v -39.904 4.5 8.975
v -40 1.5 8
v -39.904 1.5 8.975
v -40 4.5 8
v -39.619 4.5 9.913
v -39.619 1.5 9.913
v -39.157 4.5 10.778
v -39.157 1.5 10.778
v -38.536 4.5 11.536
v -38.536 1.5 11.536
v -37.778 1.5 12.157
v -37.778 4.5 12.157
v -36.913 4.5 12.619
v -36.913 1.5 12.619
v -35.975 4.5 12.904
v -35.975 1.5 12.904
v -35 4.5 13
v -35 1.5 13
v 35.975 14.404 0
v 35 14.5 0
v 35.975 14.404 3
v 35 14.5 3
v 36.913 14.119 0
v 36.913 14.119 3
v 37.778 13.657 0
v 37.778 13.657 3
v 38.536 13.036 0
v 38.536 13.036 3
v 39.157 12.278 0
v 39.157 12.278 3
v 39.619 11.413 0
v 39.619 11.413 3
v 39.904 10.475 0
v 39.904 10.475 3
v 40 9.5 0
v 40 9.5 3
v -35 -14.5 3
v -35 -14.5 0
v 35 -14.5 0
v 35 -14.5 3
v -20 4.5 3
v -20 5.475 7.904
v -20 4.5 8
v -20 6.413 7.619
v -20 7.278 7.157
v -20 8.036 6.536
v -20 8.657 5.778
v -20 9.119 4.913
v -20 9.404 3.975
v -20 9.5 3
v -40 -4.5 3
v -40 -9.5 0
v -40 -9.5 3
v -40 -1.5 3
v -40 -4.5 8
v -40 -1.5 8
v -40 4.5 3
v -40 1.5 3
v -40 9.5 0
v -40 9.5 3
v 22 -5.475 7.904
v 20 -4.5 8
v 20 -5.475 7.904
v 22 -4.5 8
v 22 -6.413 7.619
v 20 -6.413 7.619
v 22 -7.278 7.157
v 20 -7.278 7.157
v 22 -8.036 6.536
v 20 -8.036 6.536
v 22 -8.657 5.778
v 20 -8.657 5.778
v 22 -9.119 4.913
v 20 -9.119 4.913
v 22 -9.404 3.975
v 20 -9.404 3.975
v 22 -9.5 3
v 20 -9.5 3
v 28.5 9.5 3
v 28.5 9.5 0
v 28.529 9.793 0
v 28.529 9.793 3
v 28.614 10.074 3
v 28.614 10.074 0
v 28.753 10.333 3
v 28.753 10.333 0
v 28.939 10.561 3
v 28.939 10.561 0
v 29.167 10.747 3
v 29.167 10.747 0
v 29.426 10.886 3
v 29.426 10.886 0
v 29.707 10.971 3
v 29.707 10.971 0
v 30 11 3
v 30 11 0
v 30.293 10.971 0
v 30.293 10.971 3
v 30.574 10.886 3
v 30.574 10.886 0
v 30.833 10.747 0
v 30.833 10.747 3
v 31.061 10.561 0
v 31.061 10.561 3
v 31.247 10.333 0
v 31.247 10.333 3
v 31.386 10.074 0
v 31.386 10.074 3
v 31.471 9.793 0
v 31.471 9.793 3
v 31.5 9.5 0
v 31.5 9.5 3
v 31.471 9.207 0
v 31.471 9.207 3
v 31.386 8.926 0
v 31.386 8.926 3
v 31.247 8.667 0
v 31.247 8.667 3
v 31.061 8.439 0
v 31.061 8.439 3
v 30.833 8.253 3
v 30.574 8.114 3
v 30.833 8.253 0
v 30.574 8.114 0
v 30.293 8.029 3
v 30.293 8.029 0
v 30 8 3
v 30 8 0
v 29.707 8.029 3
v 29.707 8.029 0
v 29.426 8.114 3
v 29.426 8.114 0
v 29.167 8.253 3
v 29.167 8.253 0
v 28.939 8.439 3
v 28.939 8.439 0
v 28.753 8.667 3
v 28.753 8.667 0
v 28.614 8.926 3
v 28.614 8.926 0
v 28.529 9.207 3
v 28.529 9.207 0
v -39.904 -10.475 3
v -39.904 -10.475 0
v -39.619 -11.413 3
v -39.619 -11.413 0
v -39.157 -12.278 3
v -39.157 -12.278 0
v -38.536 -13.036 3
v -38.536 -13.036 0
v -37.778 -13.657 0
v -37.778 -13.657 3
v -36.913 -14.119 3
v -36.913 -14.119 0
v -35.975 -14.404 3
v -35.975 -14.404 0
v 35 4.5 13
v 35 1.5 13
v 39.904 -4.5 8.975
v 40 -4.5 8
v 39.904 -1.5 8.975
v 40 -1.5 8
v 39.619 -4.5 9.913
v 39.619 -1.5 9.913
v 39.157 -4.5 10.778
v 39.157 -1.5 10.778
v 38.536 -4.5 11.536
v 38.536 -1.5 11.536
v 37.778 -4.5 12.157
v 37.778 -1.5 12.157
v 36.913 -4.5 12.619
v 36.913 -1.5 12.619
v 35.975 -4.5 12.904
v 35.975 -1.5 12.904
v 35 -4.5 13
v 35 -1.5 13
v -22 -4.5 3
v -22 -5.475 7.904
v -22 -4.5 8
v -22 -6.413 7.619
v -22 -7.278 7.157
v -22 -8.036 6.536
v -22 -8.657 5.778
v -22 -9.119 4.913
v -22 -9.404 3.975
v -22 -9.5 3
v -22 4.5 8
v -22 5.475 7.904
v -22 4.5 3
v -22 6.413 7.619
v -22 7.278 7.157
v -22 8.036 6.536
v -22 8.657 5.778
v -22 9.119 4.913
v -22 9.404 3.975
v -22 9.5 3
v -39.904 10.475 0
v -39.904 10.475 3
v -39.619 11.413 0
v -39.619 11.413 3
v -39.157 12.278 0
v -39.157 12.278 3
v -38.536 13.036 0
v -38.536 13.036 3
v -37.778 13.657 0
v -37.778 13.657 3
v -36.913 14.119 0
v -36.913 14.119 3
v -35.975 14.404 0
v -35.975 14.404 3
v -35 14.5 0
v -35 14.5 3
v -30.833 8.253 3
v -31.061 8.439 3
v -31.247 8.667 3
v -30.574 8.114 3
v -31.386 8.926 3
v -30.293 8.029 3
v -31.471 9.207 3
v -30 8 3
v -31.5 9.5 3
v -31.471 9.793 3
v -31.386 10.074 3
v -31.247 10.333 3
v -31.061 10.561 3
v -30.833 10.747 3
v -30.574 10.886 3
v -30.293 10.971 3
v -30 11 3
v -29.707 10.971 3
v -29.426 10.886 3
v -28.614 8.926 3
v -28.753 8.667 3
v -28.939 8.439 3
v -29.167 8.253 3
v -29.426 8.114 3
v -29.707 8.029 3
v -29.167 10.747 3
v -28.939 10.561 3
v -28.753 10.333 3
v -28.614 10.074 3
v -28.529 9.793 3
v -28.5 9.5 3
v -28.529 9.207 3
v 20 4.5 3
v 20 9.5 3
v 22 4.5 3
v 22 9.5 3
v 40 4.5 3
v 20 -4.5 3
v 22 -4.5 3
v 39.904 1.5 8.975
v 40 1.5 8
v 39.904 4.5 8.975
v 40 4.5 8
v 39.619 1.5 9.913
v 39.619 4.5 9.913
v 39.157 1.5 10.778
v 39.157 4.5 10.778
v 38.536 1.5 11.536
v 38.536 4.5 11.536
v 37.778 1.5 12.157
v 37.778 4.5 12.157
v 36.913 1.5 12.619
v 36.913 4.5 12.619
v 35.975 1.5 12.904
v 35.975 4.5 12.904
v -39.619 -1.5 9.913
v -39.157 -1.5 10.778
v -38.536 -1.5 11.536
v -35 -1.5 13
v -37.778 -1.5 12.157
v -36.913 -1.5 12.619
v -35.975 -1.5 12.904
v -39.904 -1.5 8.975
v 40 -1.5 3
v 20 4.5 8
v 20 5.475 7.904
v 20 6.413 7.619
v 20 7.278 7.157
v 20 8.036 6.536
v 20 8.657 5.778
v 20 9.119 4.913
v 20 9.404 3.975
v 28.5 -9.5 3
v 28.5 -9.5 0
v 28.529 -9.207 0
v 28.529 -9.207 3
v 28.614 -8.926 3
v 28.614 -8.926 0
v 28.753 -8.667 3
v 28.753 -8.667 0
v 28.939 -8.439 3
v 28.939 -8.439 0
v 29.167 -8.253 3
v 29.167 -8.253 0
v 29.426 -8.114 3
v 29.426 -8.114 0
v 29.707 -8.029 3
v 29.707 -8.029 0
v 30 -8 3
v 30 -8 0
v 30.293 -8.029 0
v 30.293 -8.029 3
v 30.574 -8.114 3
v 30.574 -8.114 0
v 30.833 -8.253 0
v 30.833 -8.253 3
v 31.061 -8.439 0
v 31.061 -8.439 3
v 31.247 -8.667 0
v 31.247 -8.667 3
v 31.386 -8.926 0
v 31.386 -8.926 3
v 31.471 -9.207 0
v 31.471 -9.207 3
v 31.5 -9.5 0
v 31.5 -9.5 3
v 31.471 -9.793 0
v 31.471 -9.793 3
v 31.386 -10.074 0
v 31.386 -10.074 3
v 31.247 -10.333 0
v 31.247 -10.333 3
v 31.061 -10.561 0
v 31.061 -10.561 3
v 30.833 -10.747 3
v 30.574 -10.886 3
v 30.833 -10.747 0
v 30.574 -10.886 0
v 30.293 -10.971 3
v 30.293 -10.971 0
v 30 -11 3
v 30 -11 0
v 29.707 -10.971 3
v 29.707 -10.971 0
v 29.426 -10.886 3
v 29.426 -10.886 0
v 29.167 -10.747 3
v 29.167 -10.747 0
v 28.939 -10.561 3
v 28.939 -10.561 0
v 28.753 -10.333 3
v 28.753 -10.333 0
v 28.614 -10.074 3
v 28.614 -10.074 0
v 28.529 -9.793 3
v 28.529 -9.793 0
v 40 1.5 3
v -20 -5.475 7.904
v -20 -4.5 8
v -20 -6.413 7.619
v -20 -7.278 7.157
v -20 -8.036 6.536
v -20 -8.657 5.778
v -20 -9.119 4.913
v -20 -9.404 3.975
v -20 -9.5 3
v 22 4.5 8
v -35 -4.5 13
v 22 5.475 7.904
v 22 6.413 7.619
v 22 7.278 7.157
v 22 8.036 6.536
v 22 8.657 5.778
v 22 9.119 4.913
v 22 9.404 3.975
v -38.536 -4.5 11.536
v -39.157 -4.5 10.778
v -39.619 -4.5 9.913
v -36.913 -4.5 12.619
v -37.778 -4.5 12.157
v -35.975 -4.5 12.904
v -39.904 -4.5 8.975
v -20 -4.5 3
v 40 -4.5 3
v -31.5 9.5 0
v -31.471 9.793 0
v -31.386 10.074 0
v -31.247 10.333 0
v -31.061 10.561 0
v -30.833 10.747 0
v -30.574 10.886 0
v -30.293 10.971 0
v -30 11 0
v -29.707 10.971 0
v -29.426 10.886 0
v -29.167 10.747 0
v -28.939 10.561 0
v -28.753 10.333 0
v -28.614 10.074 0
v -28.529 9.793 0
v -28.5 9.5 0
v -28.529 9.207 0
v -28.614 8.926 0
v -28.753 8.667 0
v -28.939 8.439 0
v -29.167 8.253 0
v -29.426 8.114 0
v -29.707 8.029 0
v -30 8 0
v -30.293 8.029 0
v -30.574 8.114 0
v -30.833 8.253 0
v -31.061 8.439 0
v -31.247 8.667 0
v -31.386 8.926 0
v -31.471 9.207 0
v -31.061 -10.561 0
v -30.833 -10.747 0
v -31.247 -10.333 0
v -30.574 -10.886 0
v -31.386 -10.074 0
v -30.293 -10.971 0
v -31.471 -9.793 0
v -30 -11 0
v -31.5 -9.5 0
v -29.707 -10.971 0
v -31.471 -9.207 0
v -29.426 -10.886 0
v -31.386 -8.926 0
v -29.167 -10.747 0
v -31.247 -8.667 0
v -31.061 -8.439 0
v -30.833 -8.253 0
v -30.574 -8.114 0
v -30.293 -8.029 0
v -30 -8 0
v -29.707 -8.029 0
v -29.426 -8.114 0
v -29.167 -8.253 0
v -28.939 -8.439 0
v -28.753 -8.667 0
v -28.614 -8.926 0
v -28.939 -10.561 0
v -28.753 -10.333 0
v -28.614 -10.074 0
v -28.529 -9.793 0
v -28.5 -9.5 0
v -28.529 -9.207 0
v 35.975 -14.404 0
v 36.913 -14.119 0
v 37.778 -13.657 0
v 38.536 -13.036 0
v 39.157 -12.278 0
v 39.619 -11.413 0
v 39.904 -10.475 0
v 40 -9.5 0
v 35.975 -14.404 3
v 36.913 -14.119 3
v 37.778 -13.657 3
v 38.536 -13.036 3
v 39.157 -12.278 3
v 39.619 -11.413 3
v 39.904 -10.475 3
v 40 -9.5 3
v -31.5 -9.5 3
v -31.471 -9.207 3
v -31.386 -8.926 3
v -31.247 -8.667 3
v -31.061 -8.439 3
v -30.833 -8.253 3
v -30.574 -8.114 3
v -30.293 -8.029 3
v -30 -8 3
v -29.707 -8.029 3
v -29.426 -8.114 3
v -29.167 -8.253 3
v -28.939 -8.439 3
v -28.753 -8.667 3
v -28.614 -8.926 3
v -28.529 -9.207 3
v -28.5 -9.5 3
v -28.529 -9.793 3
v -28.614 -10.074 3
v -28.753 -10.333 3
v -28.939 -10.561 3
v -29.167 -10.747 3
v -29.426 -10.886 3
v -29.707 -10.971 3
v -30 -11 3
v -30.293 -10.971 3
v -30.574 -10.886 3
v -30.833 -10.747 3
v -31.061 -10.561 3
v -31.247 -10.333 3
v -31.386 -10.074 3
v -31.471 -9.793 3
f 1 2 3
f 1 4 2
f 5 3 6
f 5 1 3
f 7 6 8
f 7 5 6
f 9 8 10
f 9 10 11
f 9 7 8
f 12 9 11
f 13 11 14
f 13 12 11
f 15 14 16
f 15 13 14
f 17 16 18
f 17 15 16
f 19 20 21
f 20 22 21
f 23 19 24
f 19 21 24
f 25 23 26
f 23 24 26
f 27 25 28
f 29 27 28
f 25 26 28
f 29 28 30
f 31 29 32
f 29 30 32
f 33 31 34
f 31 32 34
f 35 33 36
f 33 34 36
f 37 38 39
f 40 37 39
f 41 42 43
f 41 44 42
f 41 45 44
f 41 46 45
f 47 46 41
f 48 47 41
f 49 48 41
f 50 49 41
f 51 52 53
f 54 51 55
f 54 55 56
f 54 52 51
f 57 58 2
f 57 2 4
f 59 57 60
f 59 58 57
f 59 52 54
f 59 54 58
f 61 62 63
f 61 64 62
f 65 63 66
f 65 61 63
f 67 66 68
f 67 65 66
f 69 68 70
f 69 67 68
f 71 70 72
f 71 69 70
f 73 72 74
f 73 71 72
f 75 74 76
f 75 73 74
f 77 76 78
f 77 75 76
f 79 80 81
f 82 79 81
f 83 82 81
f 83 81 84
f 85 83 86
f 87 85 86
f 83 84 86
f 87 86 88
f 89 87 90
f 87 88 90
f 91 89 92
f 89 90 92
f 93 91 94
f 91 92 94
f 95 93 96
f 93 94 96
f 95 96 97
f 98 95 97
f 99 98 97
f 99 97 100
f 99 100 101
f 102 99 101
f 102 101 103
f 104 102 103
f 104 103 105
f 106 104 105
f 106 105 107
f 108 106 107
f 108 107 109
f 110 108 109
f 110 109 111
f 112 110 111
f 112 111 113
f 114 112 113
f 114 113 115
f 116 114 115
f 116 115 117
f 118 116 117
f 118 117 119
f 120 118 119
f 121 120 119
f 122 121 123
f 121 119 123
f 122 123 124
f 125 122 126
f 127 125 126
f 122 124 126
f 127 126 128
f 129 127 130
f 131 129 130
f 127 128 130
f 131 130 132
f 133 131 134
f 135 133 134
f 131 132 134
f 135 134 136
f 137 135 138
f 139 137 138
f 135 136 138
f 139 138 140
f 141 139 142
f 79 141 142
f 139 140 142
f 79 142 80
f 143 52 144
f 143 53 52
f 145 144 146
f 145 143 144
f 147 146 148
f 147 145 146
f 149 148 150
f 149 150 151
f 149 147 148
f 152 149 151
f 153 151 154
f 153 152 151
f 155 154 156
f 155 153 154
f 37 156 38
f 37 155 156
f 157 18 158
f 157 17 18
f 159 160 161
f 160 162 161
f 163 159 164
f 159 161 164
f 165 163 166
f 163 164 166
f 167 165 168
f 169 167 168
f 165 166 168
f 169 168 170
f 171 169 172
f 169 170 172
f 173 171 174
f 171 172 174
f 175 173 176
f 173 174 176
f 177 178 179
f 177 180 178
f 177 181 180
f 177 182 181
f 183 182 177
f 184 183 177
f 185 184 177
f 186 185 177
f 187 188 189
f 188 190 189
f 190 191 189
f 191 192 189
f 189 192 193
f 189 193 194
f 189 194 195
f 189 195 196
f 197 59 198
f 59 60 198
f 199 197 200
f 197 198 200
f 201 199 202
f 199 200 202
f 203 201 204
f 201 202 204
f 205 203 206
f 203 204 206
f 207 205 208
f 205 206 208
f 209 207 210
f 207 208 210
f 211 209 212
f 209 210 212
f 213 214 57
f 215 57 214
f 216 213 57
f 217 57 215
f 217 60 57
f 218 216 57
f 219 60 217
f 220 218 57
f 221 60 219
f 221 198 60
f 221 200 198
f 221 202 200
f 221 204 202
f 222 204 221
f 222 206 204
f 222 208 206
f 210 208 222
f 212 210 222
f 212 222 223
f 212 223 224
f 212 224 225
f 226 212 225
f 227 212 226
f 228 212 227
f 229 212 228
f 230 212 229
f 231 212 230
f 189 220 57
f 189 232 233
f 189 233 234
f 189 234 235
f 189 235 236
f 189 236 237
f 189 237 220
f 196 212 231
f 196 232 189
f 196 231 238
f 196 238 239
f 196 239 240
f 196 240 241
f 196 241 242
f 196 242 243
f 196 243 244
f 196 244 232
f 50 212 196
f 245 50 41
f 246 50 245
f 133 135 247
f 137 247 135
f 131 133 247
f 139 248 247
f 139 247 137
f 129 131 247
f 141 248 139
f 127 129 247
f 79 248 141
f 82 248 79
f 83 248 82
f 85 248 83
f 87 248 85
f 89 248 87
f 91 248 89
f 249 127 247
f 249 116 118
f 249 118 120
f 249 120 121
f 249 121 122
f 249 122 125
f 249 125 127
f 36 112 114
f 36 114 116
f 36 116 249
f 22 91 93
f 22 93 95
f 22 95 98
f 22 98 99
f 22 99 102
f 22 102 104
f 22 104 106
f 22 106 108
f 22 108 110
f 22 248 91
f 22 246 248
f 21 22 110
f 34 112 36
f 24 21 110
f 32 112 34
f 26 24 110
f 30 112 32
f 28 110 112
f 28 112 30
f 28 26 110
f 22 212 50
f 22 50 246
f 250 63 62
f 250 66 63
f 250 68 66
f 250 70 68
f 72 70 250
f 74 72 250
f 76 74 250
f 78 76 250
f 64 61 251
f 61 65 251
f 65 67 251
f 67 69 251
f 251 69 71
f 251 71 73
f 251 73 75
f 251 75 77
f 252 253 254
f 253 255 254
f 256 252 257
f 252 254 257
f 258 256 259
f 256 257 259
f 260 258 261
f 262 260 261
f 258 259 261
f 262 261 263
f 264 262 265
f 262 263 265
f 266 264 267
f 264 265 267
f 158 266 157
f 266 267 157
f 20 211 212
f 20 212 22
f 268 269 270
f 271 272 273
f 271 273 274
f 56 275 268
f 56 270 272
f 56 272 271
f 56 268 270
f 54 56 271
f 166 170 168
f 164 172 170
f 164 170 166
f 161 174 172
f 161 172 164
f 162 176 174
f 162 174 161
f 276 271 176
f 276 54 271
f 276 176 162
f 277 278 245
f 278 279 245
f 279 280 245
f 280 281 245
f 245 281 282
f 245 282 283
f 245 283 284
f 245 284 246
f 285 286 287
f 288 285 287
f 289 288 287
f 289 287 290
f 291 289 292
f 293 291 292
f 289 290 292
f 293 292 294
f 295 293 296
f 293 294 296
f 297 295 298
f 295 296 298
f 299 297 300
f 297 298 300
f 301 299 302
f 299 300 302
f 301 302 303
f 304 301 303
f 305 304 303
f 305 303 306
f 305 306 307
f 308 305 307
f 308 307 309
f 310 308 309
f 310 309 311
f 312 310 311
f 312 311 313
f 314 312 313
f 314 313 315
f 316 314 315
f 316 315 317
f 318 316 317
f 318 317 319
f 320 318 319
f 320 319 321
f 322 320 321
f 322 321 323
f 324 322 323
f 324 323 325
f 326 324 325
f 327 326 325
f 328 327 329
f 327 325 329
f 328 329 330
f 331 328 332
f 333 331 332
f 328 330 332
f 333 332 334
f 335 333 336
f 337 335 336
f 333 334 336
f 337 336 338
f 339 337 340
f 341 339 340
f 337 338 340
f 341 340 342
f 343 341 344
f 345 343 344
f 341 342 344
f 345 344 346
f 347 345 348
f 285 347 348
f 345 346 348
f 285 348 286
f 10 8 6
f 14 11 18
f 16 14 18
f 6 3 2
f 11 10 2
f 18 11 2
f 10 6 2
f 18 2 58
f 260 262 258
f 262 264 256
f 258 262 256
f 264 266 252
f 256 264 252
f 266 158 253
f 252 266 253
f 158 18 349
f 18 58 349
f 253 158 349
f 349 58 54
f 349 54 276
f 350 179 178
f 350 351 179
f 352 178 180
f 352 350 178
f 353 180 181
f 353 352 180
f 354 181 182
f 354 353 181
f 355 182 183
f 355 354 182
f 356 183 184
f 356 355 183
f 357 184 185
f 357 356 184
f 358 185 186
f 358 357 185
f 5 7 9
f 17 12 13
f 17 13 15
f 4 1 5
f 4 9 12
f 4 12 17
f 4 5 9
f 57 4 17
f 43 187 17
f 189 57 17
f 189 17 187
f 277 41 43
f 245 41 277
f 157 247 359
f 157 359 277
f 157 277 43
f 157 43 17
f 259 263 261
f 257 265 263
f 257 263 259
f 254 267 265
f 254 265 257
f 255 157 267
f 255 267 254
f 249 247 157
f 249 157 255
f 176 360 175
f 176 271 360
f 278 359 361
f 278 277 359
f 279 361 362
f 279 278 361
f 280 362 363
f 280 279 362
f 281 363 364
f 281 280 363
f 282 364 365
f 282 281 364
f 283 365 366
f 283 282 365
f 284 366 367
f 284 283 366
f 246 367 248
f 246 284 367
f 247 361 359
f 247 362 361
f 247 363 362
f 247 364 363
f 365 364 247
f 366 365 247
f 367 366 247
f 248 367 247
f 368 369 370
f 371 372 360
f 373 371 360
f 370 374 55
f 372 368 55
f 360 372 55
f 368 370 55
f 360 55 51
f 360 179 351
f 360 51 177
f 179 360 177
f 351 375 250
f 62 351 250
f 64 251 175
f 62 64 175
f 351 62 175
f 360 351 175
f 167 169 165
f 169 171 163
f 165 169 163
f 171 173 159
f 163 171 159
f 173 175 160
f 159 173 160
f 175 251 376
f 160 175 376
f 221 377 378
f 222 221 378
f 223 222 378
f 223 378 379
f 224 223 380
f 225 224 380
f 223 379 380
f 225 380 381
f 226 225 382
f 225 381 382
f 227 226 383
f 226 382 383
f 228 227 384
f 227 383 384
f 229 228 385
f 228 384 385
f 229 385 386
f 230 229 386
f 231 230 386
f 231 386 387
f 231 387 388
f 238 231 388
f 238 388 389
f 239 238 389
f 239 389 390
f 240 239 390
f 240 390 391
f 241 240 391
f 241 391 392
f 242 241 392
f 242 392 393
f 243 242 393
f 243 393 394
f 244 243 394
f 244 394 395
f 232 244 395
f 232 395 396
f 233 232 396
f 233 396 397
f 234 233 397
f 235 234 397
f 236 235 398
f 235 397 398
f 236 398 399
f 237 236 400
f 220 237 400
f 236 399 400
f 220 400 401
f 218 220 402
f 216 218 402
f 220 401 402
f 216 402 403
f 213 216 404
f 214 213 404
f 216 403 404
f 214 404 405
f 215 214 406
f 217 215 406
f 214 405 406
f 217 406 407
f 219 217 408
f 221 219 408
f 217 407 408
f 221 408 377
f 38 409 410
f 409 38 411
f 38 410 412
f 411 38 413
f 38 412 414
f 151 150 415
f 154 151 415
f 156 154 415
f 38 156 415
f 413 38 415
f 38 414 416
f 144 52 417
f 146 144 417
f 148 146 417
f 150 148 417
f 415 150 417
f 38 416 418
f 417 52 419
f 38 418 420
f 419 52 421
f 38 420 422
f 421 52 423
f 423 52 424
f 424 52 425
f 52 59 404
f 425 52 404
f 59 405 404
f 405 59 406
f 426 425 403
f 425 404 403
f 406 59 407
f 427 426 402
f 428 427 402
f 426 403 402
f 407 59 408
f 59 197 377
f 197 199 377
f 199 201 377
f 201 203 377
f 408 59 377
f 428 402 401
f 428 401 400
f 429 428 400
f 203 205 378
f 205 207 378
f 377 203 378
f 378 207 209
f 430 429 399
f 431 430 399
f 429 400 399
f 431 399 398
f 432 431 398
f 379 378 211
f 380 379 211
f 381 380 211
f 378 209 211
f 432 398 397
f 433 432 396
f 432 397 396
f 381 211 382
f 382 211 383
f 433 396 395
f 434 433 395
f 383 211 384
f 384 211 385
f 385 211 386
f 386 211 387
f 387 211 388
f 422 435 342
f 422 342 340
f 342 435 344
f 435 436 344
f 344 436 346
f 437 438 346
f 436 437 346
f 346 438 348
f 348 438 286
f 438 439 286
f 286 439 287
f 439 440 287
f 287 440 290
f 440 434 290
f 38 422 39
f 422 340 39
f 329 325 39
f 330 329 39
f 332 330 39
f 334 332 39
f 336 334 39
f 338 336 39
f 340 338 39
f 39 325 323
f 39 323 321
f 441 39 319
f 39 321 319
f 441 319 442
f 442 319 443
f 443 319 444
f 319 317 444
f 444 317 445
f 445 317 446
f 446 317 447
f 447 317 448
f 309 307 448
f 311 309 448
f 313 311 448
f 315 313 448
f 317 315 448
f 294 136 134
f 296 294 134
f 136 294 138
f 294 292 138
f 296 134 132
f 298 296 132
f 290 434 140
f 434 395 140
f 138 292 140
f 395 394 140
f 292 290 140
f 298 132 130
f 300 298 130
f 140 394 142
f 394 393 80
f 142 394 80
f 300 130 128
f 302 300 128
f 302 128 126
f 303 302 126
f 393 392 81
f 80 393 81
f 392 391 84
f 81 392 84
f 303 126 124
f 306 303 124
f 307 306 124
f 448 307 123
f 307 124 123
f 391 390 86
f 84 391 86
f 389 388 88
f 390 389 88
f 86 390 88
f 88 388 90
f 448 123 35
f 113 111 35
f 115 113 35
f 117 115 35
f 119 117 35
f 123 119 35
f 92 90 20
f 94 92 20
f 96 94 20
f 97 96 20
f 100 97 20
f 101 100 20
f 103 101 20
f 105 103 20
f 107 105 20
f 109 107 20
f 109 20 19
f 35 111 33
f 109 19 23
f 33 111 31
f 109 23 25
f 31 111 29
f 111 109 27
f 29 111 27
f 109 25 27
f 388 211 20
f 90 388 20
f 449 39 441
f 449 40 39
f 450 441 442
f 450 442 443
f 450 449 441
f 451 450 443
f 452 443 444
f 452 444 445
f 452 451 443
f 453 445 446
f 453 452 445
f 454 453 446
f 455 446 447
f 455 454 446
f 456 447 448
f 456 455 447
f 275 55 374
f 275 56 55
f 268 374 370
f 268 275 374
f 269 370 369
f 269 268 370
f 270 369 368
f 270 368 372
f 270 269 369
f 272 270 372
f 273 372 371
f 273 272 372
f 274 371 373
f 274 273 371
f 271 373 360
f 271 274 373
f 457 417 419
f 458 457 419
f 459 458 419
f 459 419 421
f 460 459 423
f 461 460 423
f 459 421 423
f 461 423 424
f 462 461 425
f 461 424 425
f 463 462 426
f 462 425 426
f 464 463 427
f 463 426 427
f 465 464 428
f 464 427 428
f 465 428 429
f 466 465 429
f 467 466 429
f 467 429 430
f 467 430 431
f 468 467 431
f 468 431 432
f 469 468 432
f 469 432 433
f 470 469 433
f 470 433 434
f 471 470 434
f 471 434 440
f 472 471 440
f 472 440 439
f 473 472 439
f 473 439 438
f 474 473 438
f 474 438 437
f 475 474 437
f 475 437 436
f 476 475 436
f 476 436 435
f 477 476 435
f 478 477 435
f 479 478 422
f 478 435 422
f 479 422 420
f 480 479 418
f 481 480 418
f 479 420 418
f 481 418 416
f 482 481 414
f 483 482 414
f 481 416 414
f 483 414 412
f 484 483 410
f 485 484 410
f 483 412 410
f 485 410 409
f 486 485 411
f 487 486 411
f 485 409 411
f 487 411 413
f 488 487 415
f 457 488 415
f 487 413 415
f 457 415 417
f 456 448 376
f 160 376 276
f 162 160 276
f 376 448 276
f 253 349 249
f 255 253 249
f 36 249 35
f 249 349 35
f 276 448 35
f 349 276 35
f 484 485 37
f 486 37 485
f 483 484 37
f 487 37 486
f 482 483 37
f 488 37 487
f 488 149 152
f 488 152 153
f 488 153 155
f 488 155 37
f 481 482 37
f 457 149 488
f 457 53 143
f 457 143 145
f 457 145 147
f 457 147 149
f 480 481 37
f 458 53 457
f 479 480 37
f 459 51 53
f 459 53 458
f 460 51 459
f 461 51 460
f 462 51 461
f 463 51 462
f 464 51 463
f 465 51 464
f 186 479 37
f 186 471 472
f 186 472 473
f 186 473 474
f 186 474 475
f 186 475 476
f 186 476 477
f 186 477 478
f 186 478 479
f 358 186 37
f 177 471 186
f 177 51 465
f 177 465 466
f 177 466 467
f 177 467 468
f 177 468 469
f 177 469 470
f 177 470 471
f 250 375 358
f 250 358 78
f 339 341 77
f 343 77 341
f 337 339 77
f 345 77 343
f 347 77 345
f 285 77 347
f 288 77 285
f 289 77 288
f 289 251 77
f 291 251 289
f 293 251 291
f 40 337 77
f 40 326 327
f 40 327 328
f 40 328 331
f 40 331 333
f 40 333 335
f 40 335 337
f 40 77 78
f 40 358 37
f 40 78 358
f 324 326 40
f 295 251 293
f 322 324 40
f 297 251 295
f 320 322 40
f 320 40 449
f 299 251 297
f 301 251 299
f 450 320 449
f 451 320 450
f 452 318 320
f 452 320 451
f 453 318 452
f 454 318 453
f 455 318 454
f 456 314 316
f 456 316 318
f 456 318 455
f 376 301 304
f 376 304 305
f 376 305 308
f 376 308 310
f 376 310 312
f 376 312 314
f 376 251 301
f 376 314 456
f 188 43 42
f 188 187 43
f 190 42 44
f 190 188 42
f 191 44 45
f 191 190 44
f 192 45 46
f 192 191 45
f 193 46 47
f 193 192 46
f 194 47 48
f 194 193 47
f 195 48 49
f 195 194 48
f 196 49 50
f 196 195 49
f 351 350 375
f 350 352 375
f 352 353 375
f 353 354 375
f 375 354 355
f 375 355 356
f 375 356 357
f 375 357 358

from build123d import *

# Parameters (mm, degrees)
F0_W      = 80
F0_H      = 29
F1_DEPTH  = 3
F2_W      = 80
F2_H      = 3
F3_DEPTH  = 10
F4_R      = 5
F6_D      = 3
F7_W      = 2
F7_H      = 5
F8_ANGLE  = 90
F9_W      = 2
F9_H      = 5
F10_ANGLE = 90


with BuildPart() as f1:
    # F0 (on Top) → F1 (new body)
    with BuildSketch(Plane.XY):
        Rectangle(F0_W, F0_H)
    extrude(amount=F1_DEPTH)

    # F2 (on face) → F3 (join)
    with BuildSketch(Plane.XY.offset(3)):
        with Locations((0, 3)):
            Rectangle(F2_W, F2_H)
        with Locations((0, -3)):
            Rectangle(F2_W, F2_H)
    extrude(amount=F3_DEPTH)

    # F4
    f4_edges = [f1.edges().sort_by_distance(p)[0] for p in [
        (40, 14.5, 1.5),
        (40, -14.5, 1.5),
        (-40, 14.5, 1.5),
        (-40, -14.5, 1.5),
        (40, 3, 13),
        (40, -3, 13),
        (-40, 3, 13),
        (-40, -3, 13),
    ]]
    fillet(f4_edges, radius=F4_R)

    # F6 (through all)
    with Locations(Plane.XY.offset(3)):
        with Locations((-30, 9.5), (-30, -9.5), (30, -9.5), (30, 9.5)):
            Hole(F6_D / 2)

    # F7 (on face) → F8 (revolve)
    with BuildSketch(Plane(origin=(0, 4.5, 0), x_dir=(-1, 0, 0), z_dir=(0, 1, 0))):
        with Locations((-21, 5.5)):
            Rectangle(F7_W, F7_H)
        with Locations((21, 5.5)):
            Rectangle(F7_W, F7_H)
    revolve(axis=Axis((21, 4.5, 3), (-1, 0, 0)), revolution_arc=F8_ANGLE)

    # F9 (on face) → F10 (revolve)
    with BuildSketch(Plane.XZ.offset(4.5)):
        with Locations((-21.000002, 5.5)):
            Rectangle(F9_W, F9_H)
        with Locations((21.000002, 5.5)):
            Rectangle(F9_W, F9_H)
    revolve(axis=Axis((-21.000002, -4.5, 3), (1, 0, 0)), revolution_arc=F10_ANGLE)


solid = f1.part
